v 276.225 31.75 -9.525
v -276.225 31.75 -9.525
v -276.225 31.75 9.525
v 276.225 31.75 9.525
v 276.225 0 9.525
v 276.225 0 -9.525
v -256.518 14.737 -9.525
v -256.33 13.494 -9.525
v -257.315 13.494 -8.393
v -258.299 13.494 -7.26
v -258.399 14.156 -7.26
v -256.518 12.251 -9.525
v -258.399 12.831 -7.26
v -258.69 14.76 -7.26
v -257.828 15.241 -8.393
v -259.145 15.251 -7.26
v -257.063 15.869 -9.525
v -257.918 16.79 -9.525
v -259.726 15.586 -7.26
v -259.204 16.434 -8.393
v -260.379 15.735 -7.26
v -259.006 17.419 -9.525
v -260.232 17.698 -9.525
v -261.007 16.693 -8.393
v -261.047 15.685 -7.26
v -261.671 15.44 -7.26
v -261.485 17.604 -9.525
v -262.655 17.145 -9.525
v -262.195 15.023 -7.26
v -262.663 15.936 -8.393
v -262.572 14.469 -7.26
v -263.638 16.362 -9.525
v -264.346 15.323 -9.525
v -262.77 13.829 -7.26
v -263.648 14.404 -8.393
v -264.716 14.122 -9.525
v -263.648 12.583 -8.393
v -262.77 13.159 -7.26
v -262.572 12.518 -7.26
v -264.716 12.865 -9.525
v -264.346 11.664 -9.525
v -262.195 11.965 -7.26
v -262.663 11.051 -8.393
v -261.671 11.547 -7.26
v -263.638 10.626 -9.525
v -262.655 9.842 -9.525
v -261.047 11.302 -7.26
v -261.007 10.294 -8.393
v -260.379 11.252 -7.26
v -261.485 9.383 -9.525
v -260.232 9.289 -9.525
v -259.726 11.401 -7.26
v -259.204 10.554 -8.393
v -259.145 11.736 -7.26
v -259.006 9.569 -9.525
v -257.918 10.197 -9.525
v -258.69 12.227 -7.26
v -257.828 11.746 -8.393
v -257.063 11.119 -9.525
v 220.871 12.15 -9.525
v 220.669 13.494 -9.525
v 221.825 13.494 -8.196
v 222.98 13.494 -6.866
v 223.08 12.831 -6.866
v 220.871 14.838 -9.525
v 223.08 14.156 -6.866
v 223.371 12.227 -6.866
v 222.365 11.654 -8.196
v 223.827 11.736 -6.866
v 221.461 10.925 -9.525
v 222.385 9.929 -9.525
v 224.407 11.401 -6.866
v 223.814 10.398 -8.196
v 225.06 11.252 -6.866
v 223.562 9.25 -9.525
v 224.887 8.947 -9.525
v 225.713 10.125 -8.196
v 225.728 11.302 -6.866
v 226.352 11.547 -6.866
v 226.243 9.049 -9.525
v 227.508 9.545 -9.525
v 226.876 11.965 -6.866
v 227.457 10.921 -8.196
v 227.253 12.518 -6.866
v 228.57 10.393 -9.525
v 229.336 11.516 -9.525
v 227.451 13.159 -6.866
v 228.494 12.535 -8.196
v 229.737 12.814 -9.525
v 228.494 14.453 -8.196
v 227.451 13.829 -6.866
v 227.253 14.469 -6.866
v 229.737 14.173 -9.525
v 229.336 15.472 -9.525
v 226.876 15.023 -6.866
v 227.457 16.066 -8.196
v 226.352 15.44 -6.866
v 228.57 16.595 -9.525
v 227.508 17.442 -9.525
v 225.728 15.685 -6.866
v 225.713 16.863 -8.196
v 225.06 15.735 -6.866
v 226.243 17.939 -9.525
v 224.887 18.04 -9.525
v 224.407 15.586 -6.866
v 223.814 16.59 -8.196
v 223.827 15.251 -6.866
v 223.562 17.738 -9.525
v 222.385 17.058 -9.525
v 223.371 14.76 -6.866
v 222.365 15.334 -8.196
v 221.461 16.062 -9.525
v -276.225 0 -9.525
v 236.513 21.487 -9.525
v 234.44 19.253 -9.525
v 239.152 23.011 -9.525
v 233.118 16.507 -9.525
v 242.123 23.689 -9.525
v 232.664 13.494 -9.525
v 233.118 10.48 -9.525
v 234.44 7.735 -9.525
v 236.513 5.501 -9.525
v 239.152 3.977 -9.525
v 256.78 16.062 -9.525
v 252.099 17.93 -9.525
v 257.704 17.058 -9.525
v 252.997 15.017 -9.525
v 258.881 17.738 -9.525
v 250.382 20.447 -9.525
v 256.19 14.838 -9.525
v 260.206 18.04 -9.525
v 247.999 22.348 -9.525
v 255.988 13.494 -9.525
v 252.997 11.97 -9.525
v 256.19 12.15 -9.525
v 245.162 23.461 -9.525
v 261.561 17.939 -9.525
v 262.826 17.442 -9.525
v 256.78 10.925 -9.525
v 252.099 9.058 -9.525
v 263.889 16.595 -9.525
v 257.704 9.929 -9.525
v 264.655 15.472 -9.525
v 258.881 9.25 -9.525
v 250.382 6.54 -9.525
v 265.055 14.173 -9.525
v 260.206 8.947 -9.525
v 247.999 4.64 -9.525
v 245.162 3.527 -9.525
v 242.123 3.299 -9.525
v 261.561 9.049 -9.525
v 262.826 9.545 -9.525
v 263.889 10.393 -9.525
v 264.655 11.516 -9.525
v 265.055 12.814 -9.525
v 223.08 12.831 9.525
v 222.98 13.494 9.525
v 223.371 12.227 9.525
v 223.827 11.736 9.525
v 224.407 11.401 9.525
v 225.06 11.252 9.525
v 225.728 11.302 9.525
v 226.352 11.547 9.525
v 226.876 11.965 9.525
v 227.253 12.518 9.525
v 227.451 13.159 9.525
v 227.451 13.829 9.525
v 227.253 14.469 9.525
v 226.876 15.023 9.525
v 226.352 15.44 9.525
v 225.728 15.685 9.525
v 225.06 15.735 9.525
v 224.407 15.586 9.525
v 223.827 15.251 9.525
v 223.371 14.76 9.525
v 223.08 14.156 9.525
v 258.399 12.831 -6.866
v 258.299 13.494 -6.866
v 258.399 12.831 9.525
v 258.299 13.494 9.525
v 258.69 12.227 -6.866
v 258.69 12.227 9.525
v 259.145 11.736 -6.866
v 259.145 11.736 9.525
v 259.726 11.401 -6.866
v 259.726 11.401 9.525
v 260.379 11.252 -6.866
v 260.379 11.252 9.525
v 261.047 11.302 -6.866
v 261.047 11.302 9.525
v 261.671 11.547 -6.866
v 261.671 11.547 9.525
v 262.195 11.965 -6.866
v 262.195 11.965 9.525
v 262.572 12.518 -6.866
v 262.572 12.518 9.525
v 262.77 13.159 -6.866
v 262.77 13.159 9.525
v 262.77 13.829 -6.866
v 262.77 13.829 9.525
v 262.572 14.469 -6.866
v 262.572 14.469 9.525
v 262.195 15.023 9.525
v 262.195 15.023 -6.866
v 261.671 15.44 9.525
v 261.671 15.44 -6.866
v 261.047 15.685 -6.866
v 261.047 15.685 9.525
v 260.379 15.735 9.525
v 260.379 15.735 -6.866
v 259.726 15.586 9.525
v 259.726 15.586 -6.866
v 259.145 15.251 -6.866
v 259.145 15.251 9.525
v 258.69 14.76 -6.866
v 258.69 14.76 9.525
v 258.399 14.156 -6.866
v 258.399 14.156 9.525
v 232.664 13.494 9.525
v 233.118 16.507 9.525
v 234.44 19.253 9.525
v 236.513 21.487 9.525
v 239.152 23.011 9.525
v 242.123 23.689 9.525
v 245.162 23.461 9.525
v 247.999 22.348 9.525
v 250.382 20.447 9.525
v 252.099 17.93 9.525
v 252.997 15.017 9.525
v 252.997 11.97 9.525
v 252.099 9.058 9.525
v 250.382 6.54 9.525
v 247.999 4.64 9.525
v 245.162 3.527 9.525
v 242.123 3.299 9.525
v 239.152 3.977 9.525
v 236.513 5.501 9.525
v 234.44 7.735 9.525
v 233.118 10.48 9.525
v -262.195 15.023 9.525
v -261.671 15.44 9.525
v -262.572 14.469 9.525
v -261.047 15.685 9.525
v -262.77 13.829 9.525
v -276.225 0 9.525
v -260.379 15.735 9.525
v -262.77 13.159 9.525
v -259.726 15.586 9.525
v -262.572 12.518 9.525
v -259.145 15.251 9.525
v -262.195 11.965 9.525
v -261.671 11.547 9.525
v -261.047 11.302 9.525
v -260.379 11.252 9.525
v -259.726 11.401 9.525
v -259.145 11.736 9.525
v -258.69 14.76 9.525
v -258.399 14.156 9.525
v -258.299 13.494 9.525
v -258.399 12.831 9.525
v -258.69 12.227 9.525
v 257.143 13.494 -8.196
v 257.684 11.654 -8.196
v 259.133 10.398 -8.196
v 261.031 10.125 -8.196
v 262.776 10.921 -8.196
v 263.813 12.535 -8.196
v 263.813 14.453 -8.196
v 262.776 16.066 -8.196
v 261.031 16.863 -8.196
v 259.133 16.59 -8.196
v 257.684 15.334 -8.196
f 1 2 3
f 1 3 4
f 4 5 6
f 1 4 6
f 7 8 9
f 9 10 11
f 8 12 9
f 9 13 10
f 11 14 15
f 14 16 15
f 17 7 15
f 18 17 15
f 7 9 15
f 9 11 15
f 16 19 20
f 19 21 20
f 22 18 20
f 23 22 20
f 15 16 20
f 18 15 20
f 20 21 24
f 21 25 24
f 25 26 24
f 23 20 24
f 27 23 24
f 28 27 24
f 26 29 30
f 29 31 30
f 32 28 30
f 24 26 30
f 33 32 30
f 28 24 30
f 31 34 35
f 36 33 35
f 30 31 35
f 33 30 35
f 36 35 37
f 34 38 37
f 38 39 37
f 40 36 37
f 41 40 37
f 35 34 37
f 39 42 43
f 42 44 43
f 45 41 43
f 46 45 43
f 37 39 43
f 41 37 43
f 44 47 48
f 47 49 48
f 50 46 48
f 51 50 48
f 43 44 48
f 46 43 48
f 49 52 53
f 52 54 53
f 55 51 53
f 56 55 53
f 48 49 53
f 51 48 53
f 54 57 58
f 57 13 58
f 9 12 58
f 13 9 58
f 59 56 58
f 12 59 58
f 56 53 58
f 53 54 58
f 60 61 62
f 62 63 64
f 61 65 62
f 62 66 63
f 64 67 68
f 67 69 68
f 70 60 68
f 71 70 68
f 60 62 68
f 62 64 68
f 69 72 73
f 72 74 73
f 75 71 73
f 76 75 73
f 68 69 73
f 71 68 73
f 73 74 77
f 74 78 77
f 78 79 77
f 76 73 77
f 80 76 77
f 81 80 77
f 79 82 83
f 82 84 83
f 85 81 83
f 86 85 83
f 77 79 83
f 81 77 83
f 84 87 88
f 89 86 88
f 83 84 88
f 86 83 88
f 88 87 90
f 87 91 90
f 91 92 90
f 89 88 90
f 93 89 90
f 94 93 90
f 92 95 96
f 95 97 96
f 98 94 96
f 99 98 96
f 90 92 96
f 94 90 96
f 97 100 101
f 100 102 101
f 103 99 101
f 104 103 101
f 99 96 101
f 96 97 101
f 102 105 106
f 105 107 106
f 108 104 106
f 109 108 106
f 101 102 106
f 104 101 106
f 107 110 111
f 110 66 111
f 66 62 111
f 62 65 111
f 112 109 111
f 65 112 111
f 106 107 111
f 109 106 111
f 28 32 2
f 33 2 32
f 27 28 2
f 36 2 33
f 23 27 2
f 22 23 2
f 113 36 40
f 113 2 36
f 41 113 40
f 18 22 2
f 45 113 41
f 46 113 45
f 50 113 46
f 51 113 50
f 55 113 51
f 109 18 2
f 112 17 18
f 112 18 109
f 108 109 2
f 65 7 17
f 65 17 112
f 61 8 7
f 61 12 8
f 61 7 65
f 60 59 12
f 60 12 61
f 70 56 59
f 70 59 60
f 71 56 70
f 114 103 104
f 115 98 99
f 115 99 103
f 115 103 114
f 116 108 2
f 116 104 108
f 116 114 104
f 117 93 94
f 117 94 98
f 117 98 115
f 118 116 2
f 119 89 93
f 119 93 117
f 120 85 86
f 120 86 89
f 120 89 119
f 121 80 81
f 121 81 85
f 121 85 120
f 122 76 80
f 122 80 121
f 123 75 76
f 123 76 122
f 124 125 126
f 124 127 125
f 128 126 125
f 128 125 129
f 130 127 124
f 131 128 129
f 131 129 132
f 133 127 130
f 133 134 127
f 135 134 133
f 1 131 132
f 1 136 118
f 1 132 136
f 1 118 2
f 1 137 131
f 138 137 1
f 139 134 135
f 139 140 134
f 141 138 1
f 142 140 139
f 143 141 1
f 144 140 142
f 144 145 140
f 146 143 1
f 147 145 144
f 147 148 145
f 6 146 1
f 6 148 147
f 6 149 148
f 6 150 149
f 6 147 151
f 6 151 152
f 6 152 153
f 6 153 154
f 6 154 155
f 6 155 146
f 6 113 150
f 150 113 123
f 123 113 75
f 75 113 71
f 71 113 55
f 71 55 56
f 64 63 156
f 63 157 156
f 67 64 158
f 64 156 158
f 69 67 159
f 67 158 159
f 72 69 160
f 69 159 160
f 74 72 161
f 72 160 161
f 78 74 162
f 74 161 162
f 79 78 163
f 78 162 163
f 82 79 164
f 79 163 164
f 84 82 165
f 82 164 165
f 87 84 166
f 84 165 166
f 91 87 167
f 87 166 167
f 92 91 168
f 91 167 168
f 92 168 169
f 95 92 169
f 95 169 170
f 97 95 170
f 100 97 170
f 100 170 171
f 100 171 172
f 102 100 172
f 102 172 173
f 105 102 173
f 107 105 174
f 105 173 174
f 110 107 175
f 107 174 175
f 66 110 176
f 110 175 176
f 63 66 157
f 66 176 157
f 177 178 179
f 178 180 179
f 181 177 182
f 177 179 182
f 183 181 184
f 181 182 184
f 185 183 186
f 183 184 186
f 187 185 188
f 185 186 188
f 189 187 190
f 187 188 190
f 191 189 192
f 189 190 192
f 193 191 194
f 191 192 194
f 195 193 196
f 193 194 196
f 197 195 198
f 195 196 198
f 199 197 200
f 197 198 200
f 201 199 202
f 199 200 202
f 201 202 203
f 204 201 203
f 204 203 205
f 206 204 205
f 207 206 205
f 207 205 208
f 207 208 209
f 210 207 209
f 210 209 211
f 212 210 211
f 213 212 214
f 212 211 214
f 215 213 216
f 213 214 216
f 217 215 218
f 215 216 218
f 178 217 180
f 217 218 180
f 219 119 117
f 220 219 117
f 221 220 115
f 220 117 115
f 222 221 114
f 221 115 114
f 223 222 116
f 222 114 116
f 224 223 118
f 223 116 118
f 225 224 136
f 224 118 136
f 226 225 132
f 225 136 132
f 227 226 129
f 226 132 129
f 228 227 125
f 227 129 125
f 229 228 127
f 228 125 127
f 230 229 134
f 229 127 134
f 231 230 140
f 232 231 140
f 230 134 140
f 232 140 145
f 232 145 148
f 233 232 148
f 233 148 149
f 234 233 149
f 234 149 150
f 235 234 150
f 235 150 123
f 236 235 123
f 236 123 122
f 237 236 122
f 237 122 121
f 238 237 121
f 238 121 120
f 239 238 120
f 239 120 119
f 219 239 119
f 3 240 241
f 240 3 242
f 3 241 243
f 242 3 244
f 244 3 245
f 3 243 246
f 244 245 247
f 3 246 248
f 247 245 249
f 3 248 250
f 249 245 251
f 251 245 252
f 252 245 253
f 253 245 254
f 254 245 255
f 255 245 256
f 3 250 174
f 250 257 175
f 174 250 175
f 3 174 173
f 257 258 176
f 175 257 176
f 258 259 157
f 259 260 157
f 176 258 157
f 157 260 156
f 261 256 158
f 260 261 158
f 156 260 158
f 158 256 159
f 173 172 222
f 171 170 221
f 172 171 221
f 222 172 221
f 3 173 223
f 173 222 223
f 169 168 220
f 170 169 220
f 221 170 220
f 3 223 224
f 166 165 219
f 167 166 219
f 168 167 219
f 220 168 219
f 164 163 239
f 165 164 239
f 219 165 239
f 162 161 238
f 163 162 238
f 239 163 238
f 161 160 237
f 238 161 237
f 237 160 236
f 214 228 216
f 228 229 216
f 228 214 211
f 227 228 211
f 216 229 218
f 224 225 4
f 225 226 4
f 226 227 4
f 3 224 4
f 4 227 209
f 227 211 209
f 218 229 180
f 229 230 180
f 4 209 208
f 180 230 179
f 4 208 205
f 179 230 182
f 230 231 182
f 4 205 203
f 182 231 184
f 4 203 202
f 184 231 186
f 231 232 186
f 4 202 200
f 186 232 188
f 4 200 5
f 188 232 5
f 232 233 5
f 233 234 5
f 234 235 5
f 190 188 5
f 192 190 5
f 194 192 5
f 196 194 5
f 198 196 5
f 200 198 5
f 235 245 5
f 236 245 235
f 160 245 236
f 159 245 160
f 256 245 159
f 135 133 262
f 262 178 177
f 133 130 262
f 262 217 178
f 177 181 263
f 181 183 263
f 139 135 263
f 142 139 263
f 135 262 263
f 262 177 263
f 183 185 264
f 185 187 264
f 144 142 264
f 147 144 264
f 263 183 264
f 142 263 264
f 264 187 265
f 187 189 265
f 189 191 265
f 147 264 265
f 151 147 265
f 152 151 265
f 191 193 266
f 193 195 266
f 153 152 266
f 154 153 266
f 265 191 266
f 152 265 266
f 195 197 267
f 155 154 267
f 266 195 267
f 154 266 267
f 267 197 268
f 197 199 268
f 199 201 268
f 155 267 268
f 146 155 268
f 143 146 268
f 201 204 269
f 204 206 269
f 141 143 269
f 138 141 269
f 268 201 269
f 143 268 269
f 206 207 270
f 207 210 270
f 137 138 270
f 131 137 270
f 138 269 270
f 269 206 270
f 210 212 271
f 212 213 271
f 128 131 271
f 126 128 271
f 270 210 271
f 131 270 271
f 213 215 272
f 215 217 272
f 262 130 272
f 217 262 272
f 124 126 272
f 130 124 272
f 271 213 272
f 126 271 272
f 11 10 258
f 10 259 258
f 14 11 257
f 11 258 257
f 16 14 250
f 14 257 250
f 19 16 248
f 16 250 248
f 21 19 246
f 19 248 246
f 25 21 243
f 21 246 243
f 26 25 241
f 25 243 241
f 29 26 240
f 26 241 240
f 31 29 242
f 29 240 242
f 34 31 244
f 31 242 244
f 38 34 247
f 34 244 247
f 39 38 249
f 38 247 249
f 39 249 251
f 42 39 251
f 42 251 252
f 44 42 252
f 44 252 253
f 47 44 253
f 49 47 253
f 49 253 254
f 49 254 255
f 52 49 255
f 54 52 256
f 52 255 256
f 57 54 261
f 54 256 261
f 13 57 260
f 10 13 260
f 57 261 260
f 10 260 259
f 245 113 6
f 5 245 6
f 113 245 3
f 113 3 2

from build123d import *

# Parameters (mm, degrees)
SKETCH1_W                                         = 552.45
SKETCH1_H                                         = 19.05
BOSS_EXTRUDE1_DEPTH                               = 31.75
SKETCH2_R                                         = 10.2235
CUT_EXTRUDE1_DEPTH                                = 279.695560828
CSK_FOR_8_FLAT_HEAD_SOCKET_CAP_SCREW1_D           = 4.4958
CSK_FOR_8_FLAT_HEAD_SOCKET_CAP_SCREW1_CSINK_D     = 9.1186
CSK_FOR_8_FLAT_HEAD_SOCKET_CAP_SCREW1_CSINK_ANGLE = 82
CSK_FOR_8_FLAT_HEAD_MACHINE_SCREW1_D              = 4.4958
CSK_FOR_8_FLAT_HEAD_MACHINE_SCREW1_CSINK_D        = 8.4328
CSK_FOR_8_FLAT_HEAD_MACHINE_SCREW1_CSINK_ANGLE    = 82


with BuildPart() as part:
    # Sketch1 → Boss-Extrude1 (new body)
    with BuildSketch(Plane(origin=(0, 0, 0), x_dir=(1, 0, 0), z_dir=(0, 1, 0))):
        Rectangle(SKETCH1_W, SKETCH1_H)
    extrude(amount=BOSS_EXTRUDE1_DEPTH)

    # Sketch2 → Cut-Extrude1 (cut, through all)
    with BuildSketch(Plane(origin=(0, 0, -9.525), x_dir=(-1, 0, 0), z_dir=(0, 0, -1))):
        with Locations((-242.8875, 13.49375)):
            Circle(SKETCH2_R)
    extrude(amount=-CUT_EXTRUDE1_DEPTH, mode=Mode.SUBTRACT)

    # CSK for #8 Flat Head Socket Cap Screw1 (through all)
    with Locations(Plane(origin=(0, 0, -9.525), x_dir=(1, 0, 0), z_dir=(0, 0, -1))):
        with Locations((260.54685, -13.49375), (225.22815, -13.49375)):
            CounterSinkHole(CSK_FOR_8_FLAT_HEAD_SOCKET_CAP_SCREW1_D / 2, CSK_FOR_8_FLAT_HEAD_SOCKET_CAP_SCREW1_CSINK_D / 2, counter_sink_angle=CSK_FOR_8_FLAT_HEAD_SOCKET_CAP_SCREW1_CSINK_ANGLE)

    # CSK for #8 Flat Head Machine Screw1 (through all)
    with Locations(Plane(origin=(0, 0, -9.525), x_dir=(-1, 0, 0), z_dir=(0, 0, -1))):
        with Locations((260.54685, 13.49375)):
            CounterSinkHole(CSK_FOR_8_FLAT_HEAD_MACHINE_SCREW1_D / 2, CSK_FOR_8_FLAT_HEAD_MACHINE_SCREW1_CSINK_D / 2, counter_sink_angle=CSK_FOR_8_FLAT_HEAD_MACHINE_SCREW1_CSINK_ANGLE)


solid = part.part
